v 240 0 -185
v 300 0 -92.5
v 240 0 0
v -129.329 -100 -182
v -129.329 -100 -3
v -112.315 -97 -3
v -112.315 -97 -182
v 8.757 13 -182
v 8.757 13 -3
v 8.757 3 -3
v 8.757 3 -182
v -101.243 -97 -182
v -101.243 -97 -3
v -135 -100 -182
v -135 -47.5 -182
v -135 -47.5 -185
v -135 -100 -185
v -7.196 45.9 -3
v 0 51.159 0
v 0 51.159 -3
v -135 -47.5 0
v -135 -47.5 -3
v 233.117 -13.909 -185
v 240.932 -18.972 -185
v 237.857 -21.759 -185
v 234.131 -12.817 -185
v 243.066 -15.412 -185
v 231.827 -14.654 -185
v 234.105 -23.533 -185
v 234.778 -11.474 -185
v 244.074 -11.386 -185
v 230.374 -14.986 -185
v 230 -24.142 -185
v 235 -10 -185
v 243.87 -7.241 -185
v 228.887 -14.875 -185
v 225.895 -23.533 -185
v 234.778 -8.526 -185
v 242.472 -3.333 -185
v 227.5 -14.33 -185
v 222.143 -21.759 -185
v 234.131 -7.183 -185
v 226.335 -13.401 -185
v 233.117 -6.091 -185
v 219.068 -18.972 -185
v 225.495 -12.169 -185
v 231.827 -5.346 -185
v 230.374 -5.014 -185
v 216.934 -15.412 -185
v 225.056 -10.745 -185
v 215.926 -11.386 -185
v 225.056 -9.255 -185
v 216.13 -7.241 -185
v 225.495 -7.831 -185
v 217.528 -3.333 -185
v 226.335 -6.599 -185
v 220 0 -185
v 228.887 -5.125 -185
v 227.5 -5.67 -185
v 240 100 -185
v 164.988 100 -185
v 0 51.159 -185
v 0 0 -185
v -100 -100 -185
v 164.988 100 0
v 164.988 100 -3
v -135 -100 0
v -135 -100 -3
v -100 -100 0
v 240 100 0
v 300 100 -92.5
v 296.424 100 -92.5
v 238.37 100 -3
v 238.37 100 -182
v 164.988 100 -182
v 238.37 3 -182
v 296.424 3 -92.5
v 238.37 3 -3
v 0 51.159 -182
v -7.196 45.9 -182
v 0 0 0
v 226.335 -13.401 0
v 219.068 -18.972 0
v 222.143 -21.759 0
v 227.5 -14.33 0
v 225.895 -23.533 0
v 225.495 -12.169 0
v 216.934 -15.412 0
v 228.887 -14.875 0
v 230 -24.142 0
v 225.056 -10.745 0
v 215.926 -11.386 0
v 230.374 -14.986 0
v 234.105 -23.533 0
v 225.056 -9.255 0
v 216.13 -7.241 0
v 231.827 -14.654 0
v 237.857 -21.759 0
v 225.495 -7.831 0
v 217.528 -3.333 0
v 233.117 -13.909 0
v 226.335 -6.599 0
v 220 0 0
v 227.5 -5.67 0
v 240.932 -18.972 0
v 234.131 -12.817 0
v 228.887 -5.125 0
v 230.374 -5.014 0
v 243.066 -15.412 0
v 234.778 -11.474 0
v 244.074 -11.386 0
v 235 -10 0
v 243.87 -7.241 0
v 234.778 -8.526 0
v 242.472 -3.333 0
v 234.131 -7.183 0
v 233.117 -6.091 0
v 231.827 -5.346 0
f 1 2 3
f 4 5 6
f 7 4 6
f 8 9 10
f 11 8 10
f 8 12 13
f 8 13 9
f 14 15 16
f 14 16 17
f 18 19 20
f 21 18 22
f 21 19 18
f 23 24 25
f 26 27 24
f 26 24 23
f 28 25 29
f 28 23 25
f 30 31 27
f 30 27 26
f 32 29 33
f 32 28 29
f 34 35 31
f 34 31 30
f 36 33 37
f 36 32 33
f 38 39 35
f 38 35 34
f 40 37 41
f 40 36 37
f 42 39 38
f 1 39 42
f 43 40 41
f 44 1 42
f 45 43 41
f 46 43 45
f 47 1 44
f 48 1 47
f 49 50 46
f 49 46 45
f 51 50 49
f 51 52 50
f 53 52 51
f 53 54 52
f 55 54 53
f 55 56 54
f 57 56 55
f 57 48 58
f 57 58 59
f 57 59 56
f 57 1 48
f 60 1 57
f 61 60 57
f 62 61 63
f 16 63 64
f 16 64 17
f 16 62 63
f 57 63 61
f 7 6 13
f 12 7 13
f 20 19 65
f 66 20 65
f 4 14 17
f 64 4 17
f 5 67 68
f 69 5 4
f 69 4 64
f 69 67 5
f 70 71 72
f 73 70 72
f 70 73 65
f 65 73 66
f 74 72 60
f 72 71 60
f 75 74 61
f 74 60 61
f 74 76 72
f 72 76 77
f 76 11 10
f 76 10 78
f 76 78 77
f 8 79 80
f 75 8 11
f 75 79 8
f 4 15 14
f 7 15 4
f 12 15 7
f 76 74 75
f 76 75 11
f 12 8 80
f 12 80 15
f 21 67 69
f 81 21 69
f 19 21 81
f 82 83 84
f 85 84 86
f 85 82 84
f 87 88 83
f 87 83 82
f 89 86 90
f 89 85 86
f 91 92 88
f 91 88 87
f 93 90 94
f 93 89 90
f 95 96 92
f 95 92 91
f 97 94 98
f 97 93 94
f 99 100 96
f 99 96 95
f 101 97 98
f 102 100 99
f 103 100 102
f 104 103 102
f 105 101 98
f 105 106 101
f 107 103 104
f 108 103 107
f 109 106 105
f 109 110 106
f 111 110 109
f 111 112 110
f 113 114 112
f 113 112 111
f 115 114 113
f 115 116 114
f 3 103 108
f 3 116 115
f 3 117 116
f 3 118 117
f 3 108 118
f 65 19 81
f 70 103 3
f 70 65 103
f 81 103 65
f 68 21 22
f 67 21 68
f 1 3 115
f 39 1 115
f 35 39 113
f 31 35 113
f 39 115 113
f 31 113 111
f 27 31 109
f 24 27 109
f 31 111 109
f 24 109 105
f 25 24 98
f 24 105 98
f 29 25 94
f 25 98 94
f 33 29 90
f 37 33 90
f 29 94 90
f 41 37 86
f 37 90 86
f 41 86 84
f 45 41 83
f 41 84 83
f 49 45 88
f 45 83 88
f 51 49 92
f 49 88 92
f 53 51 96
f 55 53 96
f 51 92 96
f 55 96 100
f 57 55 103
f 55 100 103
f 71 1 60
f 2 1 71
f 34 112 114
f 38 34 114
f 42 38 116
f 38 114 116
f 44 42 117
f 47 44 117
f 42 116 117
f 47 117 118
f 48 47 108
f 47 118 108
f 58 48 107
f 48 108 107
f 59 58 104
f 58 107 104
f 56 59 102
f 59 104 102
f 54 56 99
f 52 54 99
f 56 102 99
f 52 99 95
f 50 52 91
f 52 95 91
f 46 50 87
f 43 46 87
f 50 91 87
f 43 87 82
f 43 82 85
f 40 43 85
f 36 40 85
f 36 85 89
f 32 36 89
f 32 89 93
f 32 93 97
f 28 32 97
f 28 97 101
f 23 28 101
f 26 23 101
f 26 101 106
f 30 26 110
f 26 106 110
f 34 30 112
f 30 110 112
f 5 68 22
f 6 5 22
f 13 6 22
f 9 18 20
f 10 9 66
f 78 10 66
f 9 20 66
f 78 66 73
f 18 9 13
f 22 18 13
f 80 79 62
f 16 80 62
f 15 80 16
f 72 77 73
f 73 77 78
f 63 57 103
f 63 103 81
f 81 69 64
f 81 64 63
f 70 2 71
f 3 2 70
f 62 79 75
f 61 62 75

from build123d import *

# Parameters (mm, degrees)
BOSS_EXTRUDE1_DEPTH = 100
SHELL1_T            = -3
SKETCH2_W           = 3
SKETCH2_H           = 179
CUT_EXTRUDE1_DEPTH  = 97
CUT_EXTRUDE2_DEPTH  = 367.367302034
SKETCH4_R           = 5
BOSS_EXTRUDE2_DEPTH = 185
BOSS_EXTRUDE3_REACH = 368.367
SHELL2_START        = -182
SHELL2_DEPTH        = 179
SKETCH6_W           = 8.912859495
SKETCH6_H           = 179
CUT_EXTRUDE3_DEPTH  = 10
CHAMFER1_SIZE       = 4
CHAMFER1_SIZE_2     = 22.685127278
BOSS_EXTRUDE4_REACH = 366.862


# Read off the part's stored shape, not the designer's step: Shell2
with BuildPart() as part:
    # Sketch1 → Boss-Extrude1 (new body)
    with BuildSketch(Plane(origin=(0, 0, 0), x_dir=(1, 0, 0), z_dir=(0, 1, 0))):
        Polygon((240, 185), (300, 92.5), (240, 0), (0, 0), (0, 185), align=None)
    extrude(amount=BOSS_EXTRUDE1_DEPTH)

    # Shell1
    shell1_openings = [part.faces().sort_by_distance(p)[0] for p in [
        (135.555555556, 100, -92.5),
    ]]
    offset(amount=SHELL1_T, openings=shell1_openings, kind=Kind.INTERSECTION)

    # Sketch2 → Cut-Extrude1 (cut)
    with BuildSketch(Plane(origin=(0, 100, 0), x_dir=(1, 0, 0), z_dir=(0, 1, 0))):
        with Locations((1.5, 92.5)):
            Rectangle(SKETCH2_W, SKETCH2_H)
    extrude(amount=-CUT_EXTRUDE1_DEPTH, mode=Mode.SUBTRACT)

    # Sketch3 → Cut-Extrude2 (cut, through all)
    with BuildSketch(Plane.XY):
        Polygon((0, 100), (0, 51.158972719), (164.988073302, 100), align=None)
    extrude(amount=-CUT_EXTRUDE2_DEPTH, mode=Mode.SUBTRACT)

    # Sketch4 → Boss-Extrude2 (add)
    with BuildSketch(Plane.XY):
        with BuildLine():
            Line((220, 0), (240, 0))
            ThreePointArc((240, 0), (230, -24.142135624), (220, 0))
        make_face()
        with Locations((230, -10)):
            Circle(SKETCH4_R, mode=Mode.SUBTRACT)
    extrude(amount=-BOSS_EXTRUDE2_DEPTH)

    # Boss-Extrude3: up to this face of the body (flat: up to its plane)
    boss_extrude3_end = Plane(part.part.faces().sort_by_distance((135.447130894, 41.883724311, -185))[0])
    # Sketch5 → Boss-Extrude3 (add, up to the picked face)
    with BuildSketch(Plane.XY, mode=Mode.PRIVATE) as boss_extrude3_sk1:
        Polygon((0, 51.158972719), (-135, -47.5), (-135, -100), (-100, -100), (0, 0), align=None)
    boss_extrude3_tool1 = split(extrude(boss_extrude3_sk1.sketch, amount=-BOSS_EXTRUDE3_REACH, mode=Mode.PRIVATE), bisect_by=boss_extrude3_end, keep=Keep.BOTH, mode=Mode.PRIVATE)
    add(boss_extrude3_tool1.solids().sort_by(Axis((-69.900259, -32.775799, 0), (0, 0, -1)))[0])

    # Shell2 outline → Shell2 (cut)
    with BuildSketch(Plane.XY.offset(SHELL2_START)):
        Polygon((0, 48.030284306), (-7.196033451, 45.900059624), (-135, -47.5), (-135, -97), (-101.242640687, -97), (-1.242640687, 3), (0, 3), align=None)
    extrude(amount=SHELL2_DEPTH, mode=Mode.SUBTRACT)

    # Sketch6 → Cut-Extrude3 (cut)
    with BuildSketch(Plane(origin=(-24.371197118, 33.348326263, 0), x_dir=(0.8073765164894111, 0.5900365756641057, 0), z_dir=(-0.5900365756641056, 0.8073765164894111, 0))):
        with Locations((25.729235331, 92.5)):
            Rectangle(SKETCH6_W, SKETCH6_H)
    extrude(amount=-CUT_EXTRUDE3_DEPTH, mode=Mode.SUBTRACT)

    # Chamfer1
    # the kernel refuses this chamfer: 22.685127278, 4 mm, written as the material it takes off along each edge
    with BuildSketch(Plane(origin=(-135, -97, -182), x_dir=(-0.21013876076735197, -0.9776715712462758, 0), z_dir=(0, 0, 1))) as chamfer1_piece_1:
        Polygon((CHAMFER1_SIZE * 0.977671571246, CHAMFER1_SIZE * 0.210138760767), (-CHAMFER1_SIZE_2 * 0.210138760772, CHAMFER1_SIZE_2 * 0.977671571267), (0, 0), align=None)
    extrude(amount=179, mode=Mode.SUBTRACT)

    # Sketch8 → Boss-Extrude4 (add, up to next)
    with BuildSketch(Plane.XY.offset(-182), mode=Mode.PRIVATE) as boss_extrude4_sk1:
        Polygon((-1.242640687, 3), (8.757359313, 13), (8.757359313, 3), align=None)
    boss_extrude4_tool1 = extrude(boss_extrude4_sk1.sketch, amount=BOSS_EXTRUDE4_REACH, mode=Mode.PRIVATE) - part.part
    add(boss_extrude4_tool1.solids().sort_by_distance((5.424026, 6.333333, -182))[0])


solid = part.part
